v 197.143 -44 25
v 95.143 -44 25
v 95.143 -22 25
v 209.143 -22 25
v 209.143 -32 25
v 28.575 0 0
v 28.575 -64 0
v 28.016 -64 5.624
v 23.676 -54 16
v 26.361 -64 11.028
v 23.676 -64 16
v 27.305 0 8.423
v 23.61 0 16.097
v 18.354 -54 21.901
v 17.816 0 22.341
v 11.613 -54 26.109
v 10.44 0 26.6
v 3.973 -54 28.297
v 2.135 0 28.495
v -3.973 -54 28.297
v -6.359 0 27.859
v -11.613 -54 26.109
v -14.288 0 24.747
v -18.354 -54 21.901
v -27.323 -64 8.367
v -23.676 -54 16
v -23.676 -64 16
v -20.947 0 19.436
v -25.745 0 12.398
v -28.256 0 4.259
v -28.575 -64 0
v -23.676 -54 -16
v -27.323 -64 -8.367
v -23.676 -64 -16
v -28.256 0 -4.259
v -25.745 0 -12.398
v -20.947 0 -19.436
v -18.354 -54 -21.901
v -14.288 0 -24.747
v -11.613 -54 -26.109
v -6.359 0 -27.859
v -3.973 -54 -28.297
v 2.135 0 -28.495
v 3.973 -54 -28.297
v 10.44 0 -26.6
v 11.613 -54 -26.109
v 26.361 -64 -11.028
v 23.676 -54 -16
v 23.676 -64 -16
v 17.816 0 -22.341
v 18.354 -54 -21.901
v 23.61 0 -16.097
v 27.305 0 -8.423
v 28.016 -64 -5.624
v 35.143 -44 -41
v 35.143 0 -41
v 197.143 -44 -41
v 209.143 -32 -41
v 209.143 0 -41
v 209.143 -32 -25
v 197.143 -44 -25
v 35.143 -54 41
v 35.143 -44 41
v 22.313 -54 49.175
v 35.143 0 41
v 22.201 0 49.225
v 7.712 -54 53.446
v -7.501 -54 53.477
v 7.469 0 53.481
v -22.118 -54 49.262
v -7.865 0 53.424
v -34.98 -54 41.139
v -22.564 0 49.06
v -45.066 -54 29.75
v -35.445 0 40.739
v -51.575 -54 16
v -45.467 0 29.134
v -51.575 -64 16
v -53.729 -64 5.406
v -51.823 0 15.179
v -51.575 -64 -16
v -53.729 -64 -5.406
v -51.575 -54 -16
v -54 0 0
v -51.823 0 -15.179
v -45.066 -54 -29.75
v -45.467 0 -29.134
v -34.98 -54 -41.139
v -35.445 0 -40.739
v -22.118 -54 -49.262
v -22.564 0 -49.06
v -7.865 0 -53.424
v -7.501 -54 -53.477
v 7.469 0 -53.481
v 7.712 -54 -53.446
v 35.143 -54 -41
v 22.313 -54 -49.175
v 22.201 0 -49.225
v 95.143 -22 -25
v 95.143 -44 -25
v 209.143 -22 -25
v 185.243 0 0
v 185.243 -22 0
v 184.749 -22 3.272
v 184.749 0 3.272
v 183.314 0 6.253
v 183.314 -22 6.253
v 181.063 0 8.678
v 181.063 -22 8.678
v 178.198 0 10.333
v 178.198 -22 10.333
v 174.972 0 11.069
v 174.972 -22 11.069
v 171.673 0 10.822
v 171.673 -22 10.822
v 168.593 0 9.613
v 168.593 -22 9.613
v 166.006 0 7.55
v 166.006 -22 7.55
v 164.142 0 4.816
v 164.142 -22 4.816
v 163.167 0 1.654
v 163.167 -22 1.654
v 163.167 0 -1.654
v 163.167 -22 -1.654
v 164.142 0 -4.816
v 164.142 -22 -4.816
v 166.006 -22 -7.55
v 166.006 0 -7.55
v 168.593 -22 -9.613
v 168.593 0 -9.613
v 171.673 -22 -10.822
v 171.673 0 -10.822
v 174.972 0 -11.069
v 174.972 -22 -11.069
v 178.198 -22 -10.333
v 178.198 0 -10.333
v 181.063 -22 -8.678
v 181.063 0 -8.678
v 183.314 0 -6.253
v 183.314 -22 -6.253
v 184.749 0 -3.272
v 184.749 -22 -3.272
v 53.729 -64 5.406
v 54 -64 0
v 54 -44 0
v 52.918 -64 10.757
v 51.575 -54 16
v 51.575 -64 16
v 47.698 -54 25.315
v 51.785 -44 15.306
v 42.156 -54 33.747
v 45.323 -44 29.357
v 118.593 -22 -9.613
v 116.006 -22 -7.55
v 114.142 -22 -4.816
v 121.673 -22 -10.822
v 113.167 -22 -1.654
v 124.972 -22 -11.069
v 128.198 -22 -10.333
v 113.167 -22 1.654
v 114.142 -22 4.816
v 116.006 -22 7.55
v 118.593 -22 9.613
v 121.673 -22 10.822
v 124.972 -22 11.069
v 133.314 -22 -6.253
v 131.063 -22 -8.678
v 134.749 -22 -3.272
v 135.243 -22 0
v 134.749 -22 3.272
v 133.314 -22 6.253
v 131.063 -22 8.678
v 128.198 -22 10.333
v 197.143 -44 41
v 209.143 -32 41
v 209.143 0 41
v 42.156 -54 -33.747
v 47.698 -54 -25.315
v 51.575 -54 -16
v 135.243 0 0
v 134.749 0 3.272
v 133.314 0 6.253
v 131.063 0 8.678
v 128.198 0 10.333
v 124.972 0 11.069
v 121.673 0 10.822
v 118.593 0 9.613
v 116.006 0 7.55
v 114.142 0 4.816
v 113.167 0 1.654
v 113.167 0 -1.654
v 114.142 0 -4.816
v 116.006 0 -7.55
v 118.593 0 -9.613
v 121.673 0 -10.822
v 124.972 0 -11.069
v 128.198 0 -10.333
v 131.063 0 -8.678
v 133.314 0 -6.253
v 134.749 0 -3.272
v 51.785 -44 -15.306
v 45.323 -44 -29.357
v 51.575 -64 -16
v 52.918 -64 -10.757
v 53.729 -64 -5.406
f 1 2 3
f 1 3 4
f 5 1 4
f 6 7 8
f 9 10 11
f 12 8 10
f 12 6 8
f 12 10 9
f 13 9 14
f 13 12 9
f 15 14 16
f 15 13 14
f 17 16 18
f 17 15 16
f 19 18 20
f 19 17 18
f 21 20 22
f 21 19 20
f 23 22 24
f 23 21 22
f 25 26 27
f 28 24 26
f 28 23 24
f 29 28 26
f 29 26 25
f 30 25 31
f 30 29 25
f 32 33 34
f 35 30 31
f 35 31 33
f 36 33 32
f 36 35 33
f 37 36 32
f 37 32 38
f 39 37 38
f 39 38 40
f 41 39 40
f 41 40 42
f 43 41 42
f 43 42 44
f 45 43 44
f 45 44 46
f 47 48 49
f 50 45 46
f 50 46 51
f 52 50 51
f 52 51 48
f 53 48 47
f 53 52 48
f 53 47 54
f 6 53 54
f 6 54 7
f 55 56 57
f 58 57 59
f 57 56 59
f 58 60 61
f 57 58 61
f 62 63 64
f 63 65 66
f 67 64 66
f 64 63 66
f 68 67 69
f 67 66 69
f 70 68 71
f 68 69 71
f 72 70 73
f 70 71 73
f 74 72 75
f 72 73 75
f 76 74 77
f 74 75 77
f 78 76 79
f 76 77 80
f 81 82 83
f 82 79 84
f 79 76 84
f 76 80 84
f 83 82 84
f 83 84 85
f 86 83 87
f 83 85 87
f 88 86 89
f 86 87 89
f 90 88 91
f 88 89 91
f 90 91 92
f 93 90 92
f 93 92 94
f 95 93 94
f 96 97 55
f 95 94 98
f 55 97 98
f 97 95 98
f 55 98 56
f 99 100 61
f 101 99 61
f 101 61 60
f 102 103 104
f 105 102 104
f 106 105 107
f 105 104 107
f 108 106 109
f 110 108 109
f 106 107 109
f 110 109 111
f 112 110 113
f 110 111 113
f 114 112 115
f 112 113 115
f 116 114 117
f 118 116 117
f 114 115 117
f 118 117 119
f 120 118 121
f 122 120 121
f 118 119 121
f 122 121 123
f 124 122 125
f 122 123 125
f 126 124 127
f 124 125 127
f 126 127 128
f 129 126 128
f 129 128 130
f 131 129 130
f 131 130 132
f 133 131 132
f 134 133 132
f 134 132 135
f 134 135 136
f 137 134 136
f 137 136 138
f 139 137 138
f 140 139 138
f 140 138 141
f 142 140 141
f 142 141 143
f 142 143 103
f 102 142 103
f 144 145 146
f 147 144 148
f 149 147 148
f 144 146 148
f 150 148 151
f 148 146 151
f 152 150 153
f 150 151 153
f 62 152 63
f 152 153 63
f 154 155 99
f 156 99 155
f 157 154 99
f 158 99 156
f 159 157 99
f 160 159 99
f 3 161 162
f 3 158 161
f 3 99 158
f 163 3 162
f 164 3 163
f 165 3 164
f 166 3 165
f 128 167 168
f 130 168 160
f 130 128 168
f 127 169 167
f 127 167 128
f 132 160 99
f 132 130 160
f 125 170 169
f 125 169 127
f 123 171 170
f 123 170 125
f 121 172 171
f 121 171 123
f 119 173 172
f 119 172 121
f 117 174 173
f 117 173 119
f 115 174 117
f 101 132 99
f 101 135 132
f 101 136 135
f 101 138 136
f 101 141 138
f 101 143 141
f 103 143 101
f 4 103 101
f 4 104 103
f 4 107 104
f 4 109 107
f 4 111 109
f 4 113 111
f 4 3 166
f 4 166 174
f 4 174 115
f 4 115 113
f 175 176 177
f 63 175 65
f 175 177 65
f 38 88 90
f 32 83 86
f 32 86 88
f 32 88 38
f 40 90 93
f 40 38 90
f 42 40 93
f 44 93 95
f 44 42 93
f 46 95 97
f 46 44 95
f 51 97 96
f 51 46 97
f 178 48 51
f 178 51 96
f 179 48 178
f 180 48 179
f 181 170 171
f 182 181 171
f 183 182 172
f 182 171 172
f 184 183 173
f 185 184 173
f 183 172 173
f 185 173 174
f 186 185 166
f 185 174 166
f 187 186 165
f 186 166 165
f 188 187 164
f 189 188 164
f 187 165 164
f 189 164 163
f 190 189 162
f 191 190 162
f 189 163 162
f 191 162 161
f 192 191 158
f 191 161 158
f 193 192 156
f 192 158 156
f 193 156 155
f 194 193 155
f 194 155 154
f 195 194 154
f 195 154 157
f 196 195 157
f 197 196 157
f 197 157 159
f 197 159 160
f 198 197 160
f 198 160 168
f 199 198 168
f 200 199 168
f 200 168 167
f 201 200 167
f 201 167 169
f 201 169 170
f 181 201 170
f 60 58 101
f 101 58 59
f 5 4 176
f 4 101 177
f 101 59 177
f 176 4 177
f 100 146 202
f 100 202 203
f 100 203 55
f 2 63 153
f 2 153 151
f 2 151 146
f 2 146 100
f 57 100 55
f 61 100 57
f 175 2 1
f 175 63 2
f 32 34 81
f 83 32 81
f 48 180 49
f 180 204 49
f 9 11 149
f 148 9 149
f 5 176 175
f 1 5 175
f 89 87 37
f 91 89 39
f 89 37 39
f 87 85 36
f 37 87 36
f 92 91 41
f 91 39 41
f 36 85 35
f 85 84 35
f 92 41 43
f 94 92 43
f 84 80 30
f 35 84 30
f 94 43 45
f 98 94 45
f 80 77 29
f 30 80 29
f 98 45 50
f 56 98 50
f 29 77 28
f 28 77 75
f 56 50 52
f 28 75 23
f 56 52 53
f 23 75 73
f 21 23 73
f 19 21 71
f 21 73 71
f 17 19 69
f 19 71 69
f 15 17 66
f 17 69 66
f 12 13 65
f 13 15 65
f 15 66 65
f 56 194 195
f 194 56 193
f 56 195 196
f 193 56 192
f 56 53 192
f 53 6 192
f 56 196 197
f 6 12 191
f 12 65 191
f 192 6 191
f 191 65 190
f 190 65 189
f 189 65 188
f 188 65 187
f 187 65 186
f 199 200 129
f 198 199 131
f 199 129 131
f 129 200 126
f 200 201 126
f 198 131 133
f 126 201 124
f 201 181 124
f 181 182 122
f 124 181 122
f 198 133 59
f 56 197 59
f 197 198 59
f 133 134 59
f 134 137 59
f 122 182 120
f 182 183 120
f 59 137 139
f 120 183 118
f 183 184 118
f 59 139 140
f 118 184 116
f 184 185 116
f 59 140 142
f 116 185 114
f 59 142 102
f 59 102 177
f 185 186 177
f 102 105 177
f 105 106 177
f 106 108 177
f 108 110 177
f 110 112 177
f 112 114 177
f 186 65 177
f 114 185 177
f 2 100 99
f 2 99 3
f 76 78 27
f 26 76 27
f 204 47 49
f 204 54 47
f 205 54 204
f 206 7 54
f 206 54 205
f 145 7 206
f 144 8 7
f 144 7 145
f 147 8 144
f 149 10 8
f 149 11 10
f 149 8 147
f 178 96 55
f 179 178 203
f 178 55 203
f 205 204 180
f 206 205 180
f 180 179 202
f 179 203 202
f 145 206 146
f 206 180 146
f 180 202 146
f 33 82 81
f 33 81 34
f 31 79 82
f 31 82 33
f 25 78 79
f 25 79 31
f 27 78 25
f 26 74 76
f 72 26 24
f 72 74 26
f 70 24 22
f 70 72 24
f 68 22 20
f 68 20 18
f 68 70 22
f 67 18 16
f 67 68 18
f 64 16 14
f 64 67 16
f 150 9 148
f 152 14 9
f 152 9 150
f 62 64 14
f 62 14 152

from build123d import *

# Parameters (mm, degrees)
F0_R     = 28.575
F1_DEPTH = 64
F2_DEPTH = 44
F3_R     = 11.1
F4_DEPTH = 44.001
F3_W     = 114
F3_H     = 50
F5_DEPTH = 22
F7_DEPTH = 10
F9_DEPTH = 95.001


with BuildPart() as f1:
    # F0 (on Front) → F1 (new body)
    with BuildSketch(Plane.XZ):
        with BuildLine():
            ThreePointArc((35.142567, -41), (49.05965, -22.564368), (54, 0))
            ThreePointArc((54, 0), (49.05965, 22.564368), (35.142567, 41))
            ThreePointArc((35.142567, 41), (-54, 0), (35.142567, -41))
        make_face()
        Circle(F0_R, mode=Mode.SUBTRACT)
    extrude(amount=F1_DEPTH)

    # F0 (on Front) → F2 (join)
    with BuildSketch(Plane.XZ):
        with BuildLine():
            ThreePointArc((35.142567, 41), (49.05965, 22.564368), (54, 0))
            ThreePointArc((54, 0), (49.05965, -22.564368), (35.142567, -41))
            Line((35.142567, -41), (209.142567, -41))
            Line((209.142567, -41), (209.142567, 41))
            Line((209.142567, 41), (35.142567, 41))
        make_face()
    extrude(amount=F2_DEPTH)

    # F3 (on face) → F4 (cut, through all)
    with BuildSketch(Plane.XZ.offset(44)):
        with Locations((174.142567, 0)):
            Circle(F3_R)
        with Locations((124.142567, 0)):
            Circle(F3_R)
    extrude(amount=-F4_DEPTH, mode=Mode.SUBTRACT)

    # F3 (on face) → F5 (cut)
    with BuildSketch(Plane.XZ.offset(44)):
        with Locations((152.142567, 0)):
            Rectangle(F3_W, F3_H)
        with Locations((124.142567, 0)):
            Circle(F3_R, mode=Mode.SUBTRACT)
        with Locations((174.142567, 0)):
            Circle(F3_R, mode=Mode.SUBTRACT)
    extrude(amount=-F5_DEPTH, mode=Mode.SUBTRACT)

    # F6 (on face) → F7 (cut)
    with BuildSketch(Plane.XZ.offset(64)):
        with BuildLine():
            ThreePointArc((51.575188, 16), (0, 54), (-51.575188, 16))
            Line((-51.575188, 16), (-23.675528, 16))
            ThreePointArc((-23.675528, 16), (0, 28.575), (23.675528, 16))
            Line((23.675528, 16), (51.575188, 16))
        make_face()
        with BuildLine():
            Line((-23.675528, -16), (-51.575188, -16))
            ThreePointArc((-51.575188, -16), (0, -54), (51.575188, -16))
            Line((51.575188, -16), (23.675528, -16))
            ThreePointArc((23.675528, -16), (0, -28.575), (-23.675528, -16))
        make_face()
    extrude(amount=-F7_DEPTH, mode=Mode.SUBTRACT)

    # F8 (on face) → F9 (cut, through all)
    with BuildSketch(Plane.XY.offset(41)):
        Polygon((197.142567, -44), (209.142567, -44), (209.142567, -32), align=None)
    extrude(amount=-F9_DEPTH, mode=Mode.SUBTRACT)


solid = f1.part
